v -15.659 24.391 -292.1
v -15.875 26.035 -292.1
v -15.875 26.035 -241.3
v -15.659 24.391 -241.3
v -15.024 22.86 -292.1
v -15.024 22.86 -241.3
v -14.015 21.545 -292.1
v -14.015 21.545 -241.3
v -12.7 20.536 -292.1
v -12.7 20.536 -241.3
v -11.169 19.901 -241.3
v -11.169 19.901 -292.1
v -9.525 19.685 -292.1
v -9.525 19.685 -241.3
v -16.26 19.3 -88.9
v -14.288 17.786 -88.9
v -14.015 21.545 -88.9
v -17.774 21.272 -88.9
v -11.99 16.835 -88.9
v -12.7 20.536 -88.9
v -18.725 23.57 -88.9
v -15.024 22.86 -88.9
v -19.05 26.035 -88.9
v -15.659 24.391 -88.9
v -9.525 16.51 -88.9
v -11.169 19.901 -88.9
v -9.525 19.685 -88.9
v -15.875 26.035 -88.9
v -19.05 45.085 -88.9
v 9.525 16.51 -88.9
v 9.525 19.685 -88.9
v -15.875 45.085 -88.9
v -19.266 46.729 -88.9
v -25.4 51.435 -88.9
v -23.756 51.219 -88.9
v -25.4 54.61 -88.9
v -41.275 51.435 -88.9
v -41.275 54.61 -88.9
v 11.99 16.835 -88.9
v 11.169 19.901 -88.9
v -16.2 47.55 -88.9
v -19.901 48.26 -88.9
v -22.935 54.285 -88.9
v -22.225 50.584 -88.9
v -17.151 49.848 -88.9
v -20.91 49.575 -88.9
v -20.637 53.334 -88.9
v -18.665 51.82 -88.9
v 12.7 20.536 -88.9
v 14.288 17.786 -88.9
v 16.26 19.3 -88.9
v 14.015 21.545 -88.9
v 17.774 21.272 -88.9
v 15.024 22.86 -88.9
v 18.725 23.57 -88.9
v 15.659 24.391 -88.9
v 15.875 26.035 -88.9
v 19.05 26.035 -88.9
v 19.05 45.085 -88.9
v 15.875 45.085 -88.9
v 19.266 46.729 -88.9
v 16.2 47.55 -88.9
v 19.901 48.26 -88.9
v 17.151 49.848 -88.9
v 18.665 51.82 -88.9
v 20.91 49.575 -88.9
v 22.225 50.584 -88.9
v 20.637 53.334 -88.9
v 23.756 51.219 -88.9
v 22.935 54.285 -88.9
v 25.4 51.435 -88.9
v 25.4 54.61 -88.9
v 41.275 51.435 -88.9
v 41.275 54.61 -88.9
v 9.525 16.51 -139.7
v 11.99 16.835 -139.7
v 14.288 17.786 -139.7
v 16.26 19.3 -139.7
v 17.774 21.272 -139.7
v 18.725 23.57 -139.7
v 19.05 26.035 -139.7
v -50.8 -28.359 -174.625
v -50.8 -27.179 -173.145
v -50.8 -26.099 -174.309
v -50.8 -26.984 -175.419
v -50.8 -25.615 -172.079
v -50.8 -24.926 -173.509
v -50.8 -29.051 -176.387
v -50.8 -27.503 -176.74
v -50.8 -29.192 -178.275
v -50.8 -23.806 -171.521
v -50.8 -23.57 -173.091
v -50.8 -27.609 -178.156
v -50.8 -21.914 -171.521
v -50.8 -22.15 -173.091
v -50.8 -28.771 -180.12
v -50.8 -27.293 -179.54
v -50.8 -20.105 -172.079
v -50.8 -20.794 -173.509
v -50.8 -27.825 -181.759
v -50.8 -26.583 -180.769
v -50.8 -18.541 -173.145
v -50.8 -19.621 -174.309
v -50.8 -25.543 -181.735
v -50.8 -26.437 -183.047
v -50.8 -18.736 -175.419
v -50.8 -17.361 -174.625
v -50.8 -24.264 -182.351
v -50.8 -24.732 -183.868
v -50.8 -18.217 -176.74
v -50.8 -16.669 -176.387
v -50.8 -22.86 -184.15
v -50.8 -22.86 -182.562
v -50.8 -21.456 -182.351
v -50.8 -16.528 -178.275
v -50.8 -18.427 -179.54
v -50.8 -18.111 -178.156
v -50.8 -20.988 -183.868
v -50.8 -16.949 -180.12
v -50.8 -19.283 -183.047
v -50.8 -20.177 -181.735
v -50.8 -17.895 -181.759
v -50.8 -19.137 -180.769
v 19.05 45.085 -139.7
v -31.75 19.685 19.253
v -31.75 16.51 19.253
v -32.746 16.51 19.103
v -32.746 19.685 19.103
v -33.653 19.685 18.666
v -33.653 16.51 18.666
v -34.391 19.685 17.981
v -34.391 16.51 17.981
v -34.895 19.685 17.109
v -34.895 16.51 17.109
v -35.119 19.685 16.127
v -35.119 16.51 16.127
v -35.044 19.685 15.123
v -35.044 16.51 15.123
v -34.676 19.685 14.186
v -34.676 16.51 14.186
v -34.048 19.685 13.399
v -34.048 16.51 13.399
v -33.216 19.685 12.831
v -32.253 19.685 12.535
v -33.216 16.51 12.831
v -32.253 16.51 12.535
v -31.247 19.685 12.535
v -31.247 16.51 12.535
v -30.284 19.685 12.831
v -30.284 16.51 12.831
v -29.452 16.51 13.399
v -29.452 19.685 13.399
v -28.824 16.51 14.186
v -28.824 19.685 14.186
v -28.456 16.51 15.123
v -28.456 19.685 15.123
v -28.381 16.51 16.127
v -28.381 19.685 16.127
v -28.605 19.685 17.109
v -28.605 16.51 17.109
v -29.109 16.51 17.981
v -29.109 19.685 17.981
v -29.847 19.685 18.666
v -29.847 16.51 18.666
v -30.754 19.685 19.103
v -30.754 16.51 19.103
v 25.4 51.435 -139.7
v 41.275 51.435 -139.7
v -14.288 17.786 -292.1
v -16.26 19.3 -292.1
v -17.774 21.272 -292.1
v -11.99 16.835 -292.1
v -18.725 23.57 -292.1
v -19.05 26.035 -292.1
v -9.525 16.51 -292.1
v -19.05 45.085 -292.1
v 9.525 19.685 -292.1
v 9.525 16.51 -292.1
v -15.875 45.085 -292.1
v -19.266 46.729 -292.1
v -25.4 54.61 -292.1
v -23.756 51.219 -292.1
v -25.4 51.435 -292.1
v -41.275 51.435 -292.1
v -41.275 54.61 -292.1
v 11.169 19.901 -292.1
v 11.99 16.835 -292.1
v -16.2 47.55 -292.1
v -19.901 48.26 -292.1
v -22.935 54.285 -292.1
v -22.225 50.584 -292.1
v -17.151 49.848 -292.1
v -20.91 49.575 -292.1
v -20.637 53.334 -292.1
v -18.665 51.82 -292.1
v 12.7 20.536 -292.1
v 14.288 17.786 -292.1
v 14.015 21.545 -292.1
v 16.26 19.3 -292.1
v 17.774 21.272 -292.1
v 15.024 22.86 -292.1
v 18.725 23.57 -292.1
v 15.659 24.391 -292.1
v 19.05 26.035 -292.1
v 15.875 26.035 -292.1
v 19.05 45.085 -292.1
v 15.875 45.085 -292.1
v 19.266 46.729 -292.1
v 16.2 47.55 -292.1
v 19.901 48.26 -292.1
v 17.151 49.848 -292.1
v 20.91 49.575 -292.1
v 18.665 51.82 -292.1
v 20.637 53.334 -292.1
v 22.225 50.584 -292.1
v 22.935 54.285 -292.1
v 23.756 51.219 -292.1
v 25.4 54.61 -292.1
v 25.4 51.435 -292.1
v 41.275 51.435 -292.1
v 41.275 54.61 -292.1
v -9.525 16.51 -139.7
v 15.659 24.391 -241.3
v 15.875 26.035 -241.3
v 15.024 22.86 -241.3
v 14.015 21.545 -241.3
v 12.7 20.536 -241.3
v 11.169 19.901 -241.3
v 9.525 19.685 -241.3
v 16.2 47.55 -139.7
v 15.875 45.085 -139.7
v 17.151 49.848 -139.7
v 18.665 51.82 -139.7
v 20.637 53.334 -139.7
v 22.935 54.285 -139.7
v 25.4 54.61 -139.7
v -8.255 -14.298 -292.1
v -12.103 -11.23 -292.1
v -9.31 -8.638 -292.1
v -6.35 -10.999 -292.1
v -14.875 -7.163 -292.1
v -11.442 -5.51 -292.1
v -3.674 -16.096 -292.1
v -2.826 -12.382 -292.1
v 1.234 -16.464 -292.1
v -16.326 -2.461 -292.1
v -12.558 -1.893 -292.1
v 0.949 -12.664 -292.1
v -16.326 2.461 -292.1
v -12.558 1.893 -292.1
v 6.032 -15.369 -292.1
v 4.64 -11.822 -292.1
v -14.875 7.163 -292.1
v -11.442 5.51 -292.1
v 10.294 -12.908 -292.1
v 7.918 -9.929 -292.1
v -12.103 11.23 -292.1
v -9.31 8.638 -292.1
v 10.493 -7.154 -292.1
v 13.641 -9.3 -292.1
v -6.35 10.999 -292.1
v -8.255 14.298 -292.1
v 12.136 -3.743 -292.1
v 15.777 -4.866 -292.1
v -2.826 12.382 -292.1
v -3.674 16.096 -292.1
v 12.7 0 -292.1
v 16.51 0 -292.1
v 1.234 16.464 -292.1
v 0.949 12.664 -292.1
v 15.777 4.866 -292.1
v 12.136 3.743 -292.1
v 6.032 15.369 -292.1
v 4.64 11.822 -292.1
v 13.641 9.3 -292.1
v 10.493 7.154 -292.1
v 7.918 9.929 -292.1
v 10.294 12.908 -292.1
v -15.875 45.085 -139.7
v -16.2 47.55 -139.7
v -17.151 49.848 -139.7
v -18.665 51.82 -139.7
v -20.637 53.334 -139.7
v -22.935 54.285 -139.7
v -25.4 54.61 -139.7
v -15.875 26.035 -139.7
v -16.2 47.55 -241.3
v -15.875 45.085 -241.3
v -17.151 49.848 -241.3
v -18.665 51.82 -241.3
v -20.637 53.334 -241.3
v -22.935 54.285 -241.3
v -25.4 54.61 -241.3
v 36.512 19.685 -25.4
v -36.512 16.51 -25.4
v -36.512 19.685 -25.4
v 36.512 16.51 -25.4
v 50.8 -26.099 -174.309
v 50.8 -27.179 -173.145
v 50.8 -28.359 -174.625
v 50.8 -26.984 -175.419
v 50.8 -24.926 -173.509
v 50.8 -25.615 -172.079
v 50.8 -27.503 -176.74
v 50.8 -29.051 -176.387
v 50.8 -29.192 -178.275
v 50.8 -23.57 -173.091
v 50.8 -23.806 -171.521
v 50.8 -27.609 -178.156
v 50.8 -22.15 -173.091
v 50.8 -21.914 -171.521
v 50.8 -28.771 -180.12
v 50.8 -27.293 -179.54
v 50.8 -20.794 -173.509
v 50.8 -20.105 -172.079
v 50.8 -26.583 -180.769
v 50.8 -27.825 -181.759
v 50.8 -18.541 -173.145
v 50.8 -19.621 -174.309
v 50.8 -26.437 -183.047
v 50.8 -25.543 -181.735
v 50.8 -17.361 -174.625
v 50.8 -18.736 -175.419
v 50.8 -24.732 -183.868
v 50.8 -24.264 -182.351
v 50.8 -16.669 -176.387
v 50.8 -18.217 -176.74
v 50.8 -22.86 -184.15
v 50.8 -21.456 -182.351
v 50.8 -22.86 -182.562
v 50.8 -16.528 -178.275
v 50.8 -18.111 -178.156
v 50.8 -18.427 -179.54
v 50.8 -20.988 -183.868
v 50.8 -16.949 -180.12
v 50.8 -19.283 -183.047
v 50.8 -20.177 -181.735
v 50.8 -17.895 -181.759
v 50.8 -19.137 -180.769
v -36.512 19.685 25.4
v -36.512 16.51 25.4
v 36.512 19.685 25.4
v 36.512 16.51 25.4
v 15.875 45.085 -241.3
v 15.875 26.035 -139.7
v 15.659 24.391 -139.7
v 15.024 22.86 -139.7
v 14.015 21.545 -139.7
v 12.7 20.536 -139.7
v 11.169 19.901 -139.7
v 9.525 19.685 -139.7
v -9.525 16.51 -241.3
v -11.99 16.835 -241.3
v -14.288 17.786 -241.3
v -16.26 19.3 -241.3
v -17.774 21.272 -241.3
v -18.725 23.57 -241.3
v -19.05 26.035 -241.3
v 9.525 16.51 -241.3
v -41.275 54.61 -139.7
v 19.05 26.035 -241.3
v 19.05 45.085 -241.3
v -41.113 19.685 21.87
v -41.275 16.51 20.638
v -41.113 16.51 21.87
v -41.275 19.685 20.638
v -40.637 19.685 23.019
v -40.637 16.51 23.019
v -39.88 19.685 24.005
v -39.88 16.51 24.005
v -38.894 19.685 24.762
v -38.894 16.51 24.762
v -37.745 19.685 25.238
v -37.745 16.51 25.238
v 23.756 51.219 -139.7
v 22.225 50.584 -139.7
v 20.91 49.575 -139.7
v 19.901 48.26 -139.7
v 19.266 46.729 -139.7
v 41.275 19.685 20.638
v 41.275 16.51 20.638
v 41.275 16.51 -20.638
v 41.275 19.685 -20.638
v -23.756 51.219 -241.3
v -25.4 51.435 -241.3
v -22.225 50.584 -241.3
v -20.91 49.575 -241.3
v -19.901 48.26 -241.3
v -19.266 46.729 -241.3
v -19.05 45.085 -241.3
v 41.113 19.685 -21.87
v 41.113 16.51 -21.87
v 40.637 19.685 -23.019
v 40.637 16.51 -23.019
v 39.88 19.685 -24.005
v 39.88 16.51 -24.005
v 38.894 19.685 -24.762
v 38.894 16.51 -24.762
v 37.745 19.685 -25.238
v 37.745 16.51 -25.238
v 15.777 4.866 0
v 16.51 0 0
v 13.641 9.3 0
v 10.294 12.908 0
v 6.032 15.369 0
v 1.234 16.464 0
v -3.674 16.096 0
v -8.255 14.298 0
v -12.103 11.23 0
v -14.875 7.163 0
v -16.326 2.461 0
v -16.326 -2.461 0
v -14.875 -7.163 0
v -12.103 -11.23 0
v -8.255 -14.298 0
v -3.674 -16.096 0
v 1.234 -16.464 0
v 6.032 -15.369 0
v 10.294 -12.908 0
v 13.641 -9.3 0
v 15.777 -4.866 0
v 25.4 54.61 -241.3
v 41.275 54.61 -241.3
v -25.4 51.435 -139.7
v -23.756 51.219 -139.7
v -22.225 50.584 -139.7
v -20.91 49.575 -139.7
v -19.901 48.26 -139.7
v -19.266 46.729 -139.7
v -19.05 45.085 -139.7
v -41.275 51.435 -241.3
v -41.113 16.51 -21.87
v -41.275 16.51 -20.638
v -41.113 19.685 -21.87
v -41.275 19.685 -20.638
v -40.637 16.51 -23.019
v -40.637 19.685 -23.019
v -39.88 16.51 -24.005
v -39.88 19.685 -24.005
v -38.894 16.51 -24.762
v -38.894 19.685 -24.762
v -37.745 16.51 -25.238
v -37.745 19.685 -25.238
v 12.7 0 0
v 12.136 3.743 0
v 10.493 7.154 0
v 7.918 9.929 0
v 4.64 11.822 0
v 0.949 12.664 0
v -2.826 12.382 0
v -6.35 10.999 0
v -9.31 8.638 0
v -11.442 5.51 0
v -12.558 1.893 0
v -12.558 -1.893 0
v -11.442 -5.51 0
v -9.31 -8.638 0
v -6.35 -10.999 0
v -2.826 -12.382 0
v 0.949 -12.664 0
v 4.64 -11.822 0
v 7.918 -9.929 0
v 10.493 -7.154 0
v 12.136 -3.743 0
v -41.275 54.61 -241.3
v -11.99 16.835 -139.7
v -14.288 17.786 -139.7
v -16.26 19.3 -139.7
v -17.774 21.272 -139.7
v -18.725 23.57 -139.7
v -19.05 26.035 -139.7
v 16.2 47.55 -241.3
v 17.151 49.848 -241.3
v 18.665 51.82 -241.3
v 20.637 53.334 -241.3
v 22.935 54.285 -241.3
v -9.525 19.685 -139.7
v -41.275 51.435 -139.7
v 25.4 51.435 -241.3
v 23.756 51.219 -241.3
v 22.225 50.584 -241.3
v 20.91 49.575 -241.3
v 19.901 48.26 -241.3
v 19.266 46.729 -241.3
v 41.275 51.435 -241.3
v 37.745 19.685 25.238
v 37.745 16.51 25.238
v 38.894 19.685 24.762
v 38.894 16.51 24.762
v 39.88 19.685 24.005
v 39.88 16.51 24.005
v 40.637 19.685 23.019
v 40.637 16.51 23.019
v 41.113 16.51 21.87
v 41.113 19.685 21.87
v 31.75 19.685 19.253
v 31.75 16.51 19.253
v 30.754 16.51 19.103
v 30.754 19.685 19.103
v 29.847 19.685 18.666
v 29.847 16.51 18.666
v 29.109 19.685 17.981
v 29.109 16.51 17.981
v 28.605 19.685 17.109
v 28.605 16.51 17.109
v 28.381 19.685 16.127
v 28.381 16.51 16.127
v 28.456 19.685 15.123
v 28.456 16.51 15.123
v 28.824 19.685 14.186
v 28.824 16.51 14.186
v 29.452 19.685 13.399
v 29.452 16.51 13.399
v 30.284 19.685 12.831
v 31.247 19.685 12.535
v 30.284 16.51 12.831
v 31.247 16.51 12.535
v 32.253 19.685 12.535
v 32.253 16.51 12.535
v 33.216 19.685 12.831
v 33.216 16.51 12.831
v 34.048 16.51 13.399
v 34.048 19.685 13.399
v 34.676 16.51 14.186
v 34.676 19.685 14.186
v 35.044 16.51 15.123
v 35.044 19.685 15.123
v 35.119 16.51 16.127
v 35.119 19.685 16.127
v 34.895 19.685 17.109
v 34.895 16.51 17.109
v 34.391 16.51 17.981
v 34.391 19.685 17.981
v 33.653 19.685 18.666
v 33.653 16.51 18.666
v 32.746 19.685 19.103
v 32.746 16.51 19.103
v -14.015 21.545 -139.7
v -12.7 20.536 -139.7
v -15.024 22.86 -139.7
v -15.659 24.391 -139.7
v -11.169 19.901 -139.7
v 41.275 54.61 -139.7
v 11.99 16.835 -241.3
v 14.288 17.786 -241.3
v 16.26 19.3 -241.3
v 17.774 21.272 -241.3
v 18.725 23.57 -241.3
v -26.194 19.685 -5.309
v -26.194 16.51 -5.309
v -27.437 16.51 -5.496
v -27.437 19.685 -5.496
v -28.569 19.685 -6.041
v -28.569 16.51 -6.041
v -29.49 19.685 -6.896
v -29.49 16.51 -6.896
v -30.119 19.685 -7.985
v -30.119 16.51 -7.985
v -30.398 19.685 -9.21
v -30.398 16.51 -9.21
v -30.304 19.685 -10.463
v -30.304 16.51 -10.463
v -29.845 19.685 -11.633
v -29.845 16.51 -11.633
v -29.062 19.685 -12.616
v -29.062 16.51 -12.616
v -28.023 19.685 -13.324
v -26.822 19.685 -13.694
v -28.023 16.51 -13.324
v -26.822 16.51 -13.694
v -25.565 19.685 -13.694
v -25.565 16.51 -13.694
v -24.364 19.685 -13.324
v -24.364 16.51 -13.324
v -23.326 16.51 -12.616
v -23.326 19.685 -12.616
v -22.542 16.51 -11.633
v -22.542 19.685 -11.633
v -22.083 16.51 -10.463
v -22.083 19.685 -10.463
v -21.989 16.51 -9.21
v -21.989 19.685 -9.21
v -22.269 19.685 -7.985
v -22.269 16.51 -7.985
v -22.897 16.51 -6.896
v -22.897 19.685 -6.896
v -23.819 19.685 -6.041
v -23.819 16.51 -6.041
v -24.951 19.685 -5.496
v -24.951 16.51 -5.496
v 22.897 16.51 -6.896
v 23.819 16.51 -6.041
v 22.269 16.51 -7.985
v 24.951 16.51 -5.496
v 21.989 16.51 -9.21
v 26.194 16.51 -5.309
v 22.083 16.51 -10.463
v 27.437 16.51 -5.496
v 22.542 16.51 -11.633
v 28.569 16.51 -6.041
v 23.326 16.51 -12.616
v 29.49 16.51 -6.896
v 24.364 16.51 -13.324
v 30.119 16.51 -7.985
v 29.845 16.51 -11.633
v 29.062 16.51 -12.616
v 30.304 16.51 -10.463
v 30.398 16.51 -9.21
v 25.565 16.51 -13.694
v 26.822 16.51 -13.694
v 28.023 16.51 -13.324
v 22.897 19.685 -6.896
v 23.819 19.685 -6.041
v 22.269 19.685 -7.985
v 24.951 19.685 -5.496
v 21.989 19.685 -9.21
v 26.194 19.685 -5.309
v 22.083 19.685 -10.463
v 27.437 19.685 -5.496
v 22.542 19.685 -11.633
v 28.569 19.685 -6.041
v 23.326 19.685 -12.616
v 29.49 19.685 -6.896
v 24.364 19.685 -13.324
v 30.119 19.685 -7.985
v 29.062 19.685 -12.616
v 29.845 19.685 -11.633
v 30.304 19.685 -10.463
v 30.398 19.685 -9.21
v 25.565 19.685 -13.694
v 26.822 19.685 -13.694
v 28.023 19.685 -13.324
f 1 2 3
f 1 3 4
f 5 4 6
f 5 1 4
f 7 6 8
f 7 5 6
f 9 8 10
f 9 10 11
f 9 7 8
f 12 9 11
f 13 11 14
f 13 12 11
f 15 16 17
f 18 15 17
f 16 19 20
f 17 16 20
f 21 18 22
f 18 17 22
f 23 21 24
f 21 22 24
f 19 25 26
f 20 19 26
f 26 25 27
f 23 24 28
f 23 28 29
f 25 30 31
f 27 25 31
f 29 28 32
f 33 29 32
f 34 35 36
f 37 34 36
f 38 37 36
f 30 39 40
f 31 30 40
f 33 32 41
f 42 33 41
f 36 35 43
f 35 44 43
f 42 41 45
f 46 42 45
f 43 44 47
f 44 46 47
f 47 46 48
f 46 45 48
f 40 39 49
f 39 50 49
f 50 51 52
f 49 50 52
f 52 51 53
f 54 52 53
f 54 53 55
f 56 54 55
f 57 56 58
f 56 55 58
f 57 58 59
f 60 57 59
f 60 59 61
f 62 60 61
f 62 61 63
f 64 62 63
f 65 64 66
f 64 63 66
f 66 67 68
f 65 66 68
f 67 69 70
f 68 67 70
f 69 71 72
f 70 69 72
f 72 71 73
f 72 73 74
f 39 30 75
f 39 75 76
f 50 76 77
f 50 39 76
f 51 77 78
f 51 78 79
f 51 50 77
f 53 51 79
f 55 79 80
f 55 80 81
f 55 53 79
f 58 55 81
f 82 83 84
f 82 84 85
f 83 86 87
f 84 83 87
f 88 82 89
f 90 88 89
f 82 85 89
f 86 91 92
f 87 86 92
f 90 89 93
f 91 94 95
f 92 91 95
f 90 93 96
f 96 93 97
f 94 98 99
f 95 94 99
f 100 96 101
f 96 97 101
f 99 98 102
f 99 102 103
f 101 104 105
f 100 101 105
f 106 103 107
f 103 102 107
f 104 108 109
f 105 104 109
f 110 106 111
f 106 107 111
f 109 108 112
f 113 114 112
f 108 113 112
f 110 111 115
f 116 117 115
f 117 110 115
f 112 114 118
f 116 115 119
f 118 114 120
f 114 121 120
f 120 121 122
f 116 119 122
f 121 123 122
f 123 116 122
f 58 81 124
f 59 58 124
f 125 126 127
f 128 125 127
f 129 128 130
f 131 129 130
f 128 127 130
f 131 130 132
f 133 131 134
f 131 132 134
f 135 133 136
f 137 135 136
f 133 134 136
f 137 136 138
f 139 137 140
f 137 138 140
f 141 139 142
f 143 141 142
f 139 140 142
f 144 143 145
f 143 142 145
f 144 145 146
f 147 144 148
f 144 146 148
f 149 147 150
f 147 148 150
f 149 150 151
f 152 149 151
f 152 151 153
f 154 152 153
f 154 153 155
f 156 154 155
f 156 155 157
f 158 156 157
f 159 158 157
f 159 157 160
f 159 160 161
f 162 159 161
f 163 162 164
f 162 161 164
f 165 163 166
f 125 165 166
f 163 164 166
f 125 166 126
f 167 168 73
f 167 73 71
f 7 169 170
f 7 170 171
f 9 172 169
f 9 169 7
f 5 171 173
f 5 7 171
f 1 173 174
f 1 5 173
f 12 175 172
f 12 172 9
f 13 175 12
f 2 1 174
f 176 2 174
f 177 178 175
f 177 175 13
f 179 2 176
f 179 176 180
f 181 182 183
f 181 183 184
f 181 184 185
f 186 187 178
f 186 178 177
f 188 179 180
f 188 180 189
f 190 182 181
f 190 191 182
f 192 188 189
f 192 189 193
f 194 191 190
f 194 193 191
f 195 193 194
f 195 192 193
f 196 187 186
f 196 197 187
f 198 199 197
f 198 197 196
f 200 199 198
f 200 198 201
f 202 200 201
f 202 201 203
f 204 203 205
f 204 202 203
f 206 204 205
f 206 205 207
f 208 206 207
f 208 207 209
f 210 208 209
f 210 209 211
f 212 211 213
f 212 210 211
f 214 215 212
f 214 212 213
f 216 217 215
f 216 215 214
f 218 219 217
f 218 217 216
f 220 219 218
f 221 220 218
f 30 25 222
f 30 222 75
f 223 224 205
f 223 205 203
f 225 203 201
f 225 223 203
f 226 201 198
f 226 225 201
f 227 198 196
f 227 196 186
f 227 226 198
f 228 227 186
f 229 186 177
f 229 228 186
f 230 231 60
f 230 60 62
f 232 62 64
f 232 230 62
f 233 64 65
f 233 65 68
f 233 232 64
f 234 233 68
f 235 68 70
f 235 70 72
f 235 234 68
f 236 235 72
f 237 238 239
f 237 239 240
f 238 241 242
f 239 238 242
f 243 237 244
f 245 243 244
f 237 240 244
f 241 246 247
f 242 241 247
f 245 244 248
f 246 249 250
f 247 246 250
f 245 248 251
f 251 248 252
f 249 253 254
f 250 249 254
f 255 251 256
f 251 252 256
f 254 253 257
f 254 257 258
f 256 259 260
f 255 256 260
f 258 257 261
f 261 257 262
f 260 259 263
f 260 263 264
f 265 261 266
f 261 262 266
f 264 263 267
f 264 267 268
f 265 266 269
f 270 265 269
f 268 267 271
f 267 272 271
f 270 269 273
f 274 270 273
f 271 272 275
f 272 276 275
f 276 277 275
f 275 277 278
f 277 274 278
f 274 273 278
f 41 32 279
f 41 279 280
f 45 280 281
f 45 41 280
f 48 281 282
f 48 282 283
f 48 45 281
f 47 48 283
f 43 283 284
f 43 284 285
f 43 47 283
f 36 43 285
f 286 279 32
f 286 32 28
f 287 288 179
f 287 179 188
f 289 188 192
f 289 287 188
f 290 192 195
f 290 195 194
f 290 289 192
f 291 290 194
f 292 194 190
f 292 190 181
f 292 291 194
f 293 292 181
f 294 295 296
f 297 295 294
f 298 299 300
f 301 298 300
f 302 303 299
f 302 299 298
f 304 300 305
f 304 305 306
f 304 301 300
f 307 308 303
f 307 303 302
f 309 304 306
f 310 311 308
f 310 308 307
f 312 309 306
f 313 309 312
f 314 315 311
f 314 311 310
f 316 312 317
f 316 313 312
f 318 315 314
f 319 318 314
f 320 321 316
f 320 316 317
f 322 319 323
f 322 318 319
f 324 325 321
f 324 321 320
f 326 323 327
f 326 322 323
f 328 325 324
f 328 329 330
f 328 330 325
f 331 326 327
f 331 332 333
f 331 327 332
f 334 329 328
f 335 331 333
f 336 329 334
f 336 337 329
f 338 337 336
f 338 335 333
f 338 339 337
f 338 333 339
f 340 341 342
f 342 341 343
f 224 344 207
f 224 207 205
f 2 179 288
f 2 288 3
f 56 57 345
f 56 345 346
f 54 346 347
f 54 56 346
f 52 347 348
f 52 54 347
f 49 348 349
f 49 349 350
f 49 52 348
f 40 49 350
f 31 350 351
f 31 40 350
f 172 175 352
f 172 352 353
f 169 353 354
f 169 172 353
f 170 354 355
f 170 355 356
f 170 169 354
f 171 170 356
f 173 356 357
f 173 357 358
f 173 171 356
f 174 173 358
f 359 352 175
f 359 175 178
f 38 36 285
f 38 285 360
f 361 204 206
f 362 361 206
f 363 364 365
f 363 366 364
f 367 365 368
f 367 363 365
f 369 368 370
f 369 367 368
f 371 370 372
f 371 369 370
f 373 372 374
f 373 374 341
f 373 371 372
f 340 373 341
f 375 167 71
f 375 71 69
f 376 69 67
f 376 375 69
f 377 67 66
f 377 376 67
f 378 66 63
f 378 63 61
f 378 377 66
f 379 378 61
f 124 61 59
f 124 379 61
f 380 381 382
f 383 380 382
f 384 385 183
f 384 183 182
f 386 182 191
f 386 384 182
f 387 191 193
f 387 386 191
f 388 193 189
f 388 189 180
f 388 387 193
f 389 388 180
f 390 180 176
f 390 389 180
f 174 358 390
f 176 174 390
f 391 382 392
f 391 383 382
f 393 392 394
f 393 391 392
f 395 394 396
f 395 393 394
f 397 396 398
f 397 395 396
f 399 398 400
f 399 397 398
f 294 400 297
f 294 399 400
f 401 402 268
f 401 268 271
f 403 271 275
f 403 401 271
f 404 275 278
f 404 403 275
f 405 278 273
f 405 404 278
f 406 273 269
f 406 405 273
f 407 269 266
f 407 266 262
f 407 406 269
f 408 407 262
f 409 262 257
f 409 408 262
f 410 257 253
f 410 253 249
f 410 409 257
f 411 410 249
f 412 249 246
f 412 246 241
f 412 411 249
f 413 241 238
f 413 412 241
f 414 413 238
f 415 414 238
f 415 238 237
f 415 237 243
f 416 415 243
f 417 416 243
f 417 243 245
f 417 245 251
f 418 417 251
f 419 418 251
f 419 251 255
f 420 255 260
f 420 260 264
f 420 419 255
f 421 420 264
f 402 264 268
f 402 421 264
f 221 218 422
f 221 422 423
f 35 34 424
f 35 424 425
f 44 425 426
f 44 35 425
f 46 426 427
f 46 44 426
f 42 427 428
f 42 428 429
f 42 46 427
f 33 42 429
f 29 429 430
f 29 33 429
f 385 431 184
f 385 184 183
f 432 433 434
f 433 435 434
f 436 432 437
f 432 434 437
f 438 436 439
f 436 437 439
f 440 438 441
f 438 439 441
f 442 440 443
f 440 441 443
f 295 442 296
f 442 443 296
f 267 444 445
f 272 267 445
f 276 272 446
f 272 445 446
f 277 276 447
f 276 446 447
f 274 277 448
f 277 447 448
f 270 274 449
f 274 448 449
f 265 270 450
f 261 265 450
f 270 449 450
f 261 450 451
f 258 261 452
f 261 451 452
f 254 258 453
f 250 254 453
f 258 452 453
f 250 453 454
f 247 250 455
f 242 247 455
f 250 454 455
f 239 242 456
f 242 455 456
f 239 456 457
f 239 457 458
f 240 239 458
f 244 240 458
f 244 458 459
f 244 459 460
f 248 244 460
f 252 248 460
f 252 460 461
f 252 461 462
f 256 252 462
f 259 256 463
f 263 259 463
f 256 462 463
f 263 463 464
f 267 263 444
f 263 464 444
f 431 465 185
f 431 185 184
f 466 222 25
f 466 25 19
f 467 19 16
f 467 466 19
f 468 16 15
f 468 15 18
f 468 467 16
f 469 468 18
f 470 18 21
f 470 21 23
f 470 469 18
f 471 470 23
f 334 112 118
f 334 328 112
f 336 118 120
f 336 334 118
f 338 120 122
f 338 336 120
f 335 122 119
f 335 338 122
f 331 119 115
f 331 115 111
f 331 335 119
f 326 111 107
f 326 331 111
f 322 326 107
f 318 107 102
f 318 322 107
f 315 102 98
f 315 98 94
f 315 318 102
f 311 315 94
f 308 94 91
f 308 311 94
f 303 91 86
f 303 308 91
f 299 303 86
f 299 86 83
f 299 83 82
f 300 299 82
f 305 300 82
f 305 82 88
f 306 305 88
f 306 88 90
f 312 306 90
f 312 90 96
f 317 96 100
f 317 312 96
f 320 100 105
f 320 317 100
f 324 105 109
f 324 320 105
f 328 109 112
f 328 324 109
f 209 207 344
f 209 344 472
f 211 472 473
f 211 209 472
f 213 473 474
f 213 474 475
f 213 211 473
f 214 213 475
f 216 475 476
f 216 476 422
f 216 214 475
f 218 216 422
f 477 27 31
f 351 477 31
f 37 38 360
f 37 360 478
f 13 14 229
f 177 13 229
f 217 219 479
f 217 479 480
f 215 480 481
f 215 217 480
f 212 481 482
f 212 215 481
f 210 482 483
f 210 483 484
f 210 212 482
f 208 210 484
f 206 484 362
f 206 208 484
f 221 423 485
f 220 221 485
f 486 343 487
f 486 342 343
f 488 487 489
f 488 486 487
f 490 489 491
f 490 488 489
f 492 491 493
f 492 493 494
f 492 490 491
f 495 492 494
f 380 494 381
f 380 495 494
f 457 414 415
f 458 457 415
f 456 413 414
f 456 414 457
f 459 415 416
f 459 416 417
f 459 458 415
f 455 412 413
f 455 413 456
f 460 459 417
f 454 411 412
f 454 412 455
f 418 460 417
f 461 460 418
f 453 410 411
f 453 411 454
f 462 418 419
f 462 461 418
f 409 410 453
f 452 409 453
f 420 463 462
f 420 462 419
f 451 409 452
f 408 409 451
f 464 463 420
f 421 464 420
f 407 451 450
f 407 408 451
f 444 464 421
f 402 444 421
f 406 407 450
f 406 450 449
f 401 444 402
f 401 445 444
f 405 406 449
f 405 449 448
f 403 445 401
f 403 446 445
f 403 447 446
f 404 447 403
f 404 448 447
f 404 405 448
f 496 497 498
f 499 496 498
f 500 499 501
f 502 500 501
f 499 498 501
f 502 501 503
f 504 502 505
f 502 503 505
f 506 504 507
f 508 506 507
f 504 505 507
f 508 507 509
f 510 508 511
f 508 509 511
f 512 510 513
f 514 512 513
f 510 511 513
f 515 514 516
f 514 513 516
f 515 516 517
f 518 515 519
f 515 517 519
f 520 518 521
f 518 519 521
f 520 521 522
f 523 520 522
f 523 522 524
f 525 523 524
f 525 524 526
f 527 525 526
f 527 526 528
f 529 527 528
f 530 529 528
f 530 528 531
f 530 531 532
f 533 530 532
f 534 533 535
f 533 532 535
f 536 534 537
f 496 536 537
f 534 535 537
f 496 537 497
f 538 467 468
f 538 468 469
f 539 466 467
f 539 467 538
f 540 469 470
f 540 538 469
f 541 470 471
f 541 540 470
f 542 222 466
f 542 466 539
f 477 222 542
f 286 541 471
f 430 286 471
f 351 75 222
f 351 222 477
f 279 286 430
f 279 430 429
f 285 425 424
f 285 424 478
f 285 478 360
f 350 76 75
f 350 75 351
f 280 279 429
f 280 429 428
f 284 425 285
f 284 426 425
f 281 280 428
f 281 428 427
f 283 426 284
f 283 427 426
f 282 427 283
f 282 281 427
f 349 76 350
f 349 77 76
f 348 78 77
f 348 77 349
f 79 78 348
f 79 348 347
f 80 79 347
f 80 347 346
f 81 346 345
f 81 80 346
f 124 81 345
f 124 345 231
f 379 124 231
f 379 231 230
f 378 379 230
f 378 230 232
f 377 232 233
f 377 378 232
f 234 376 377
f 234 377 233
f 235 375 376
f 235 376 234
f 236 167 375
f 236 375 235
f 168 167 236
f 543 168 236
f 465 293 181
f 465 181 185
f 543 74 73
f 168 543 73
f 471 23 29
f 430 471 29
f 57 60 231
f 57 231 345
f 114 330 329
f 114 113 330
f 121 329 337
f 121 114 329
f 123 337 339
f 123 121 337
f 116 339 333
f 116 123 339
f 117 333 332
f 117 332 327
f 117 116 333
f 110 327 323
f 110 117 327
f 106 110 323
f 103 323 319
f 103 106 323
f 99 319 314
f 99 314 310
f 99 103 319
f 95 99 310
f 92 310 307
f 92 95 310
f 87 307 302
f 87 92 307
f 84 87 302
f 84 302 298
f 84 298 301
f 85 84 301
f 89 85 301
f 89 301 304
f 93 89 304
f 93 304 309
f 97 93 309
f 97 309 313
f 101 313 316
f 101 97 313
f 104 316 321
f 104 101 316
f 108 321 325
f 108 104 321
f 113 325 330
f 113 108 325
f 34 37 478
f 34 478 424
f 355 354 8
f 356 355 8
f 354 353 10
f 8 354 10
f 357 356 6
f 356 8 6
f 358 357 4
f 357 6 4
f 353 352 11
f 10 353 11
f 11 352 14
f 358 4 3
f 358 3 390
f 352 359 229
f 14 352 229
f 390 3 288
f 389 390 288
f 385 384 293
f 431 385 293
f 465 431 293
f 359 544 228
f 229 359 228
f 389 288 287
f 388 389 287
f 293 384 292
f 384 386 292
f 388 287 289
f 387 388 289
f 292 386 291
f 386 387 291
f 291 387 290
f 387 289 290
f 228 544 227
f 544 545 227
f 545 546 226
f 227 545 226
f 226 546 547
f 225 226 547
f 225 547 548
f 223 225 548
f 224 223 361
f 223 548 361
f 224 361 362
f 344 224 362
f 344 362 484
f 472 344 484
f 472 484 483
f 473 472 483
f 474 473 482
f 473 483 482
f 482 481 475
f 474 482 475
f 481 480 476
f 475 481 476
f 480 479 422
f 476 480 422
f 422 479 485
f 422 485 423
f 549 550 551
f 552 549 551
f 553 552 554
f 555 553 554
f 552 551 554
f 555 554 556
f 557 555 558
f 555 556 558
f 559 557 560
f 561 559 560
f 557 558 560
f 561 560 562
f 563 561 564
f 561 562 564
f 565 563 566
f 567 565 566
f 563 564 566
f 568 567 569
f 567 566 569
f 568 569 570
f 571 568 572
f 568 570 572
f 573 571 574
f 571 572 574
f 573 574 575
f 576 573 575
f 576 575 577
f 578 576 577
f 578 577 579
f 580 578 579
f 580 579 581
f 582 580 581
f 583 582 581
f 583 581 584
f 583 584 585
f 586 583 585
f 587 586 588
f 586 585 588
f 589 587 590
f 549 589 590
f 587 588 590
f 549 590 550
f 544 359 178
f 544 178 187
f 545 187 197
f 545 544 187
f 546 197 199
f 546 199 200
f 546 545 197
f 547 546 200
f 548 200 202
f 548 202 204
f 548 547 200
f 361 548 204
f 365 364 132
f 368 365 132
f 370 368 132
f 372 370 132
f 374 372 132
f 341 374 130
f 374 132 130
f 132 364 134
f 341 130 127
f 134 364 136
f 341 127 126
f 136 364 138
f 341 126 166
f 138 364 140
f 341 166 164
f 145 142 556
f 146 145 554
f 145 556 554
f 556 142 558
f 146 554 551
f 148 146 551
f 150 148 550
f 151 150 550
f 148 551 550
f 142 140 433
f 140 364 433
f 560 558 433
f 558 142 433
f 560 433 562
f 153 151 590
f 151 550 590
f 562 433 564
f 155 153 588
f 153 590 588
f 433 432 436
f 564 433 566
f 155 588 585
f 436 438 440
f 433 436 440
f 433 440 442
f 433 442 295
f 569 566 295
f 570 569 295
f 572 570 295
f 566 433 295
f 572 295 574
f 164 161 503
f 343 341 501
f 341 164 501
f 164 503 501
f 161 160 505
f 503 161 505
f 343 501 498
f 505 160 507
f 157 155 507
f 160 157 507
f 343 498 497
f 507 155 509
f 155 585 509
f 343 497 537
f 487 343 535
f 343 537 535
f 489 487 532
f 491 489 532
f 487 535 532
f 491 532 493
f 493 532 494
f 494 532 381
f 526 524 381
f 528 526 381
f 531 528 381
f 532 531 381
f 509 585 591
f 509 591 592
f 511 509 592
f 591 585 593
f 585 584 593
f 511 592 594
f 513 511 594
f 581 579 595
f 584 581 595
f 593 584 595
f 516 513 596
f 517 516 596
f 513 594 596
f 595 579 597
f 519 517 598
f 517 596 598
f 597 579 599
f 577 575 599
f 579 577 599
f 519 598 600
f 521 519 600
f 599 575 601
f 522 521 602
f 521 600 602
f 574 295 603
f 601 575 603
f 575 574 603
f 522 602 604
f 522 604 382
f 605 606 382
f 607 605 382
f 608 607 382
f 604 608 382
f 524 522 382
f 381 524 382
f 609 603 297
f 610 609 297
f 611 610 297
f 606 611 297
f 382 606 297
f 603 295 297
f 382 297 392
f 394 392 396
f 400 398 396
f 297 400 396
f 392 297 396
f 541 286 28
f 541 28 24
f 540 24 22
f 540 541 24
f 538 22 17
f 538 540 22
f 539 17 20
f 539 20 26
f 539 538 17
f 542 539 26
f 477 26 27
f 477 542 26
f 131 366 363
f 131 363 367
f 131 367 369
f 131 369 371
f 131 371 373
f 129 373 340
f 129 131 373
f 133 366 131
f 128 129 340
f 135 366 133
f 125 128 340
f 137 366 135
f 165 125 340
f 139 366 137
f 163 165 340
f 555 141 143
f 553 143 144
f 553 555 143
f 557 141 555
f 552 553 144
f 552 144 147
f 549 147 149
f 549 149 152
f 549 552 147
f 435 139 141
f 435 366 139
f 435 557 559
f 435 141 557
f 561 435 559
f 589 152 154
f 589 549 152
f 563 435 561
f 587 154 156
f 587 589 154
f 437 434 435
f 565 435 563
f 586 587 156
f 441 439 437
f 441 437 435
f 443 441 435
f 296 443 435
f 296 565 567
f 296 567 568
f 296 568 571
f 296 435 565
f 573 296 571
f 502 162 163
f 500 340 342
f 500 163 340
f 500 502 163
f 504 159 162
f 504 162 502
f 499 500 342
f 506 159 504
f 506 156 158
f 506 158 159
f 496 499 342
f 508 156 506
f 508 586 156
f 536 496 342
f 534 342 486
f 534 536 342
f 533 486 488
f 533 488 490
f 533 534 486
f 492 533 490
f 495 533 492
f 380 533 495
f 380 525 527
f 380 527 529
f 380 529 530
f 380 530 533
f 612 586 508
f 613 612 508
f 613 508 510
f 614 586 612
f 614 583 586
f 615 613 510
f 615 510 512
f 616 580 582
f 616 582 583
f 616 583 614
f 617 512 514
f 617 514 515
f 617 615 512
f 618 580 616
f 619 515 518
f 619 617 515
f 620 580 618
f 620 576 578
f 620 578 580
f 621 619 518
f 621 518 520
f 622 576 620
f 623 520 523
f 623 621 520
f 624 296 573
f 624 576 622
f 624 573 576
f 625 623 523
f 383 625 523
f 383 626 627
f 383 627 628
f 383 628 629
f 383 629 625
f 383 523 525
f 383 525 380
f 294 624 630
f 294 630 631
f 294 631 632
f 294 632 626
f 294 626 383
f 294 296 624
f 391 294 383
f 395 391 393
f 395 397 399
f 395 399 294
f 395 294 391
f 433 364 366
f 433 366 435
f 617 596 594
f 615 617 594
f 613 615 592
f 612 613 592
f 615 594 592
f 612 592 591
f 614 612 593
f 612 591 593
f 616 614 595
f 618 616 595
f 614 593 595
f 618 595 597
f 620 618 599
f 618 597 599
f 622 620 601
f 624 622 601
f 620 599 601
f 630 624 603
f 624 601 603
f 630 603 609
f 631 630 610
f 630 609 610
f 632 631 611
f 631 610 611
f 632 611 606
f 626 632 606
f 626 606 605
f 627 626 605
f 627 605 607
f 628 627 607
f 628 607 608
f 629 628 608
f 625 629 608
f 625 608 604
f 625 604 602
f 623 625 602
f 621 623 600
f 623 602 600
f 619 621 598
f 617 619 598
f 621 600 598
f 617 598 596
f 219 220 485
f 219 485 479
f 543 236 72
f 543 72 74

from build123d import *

# Parameters (mm, degrees)
SKETCH1_R                         = 16.51
SKETCH1_R_2                       = 12.7
BOSS_EXTRUDE1_DEPTH               = 292.1
BOSS_EXTRUDE2_START               = 16.51
SKETCH2_W                         = 82.55
SKETCH2_H                         = 50.8
BOSS_EXTRUDE2_DEPTH               = 3.175
SKETCH2_W_2                       = 38.1
BOSS_EXTRUDE2_2_DEPTH             = 3.175
FILLET1_R                         = 4.7625
SKETCH4_W                         = 3.3782
SKETCH4_H                         = 36.195
F_1_4_CLEARANCE_HOLE1_AT_2_COUNT  = 2
F_1_4_CLEARANCE_HOLE1_AT_2_PITCH  = 63.5
SKETCH18_W                        = 4.2164
SKETCH18_H                        = 36.195
F_5_16_CLEARANCE_HOLE1_AT_2_COUNT = 2
F_5_16_CLEARANCE_HOLE1_AT_2_PITCH = 52.3875
SKETCH16_R                        = 6.35
SKETCH16_R_2                      = 4.7625
BOSS_EXTRUDE3_DEPTH               = 50.8
EDGE_FLANGE1_STRIP_W              = 25.4
EDGE_FLANGE1_STRIP_H              = 3.175
EDGE_FLANGE1_STRIP_CUT_DEPTH      = 50.8
EDGE_FLANGE1_STRIP_2_W            = 25.4
EDGE_FLANGE1_STRIP_2_H            = 3.175
EDGE_FLANGE1_STRIP_CUT_2_DEPTH    = 50.8
EDGE_FLANGE1_DEPTH                = 50.8
EDGE_FLANGE1_BEND_DEPTH           = 50.8
EDGE_FLANGE3_STRIP_W              = 25.4
EDGE_FLANGE3_STRIP_H              = 3.175
EDGE_FLANGE3_STRIP_CUT_DEPTH      = 50.8
EDGE_FLANGE3_STRIP_2_W            = 25.4
EDGE_FLANGE3_STRIP_2_H            = 3.175
EDGE_FLANGE3_STRIP_CUT_2_DEPTH    = 50.8
EDGE_FLANGE3_DEPTH                = 50.8
EDGE_FLANGE3_BEND_DEPTH           = 50.8
LPATTERN1_COUNT                   = 2
LPATTERN1_PITCH                   = 152.4


# Sheet-metal steps are written as plain solids
with BuildPart() as part:
    # Sketch1 → Boss-Extrude1 (new body)
    with BuildSketch(Plane.XY):
        Circle(SKETCH1_R)
        Circle(SKETCH1_R_2, mode=Mode.SUBTRACT)
    extrude(amount=-BOSS_EXTRUDE1_DEPTH)


with BuildPart() as body_2:
    # Sketch2 → Boss-Extrude2 (new body)
    with BuildSketch(Plane(origin=(0, 0, 0), x_dir=(1, 0, 0), z_dir=(0, 1, 0)).offset(BOSS_EXTRUDE2_START)):
        Rectangle(SKETCH2_W, SKETCH2_H)
    extrude(amount=BOSS_EXTRUDE2_DEPTH)

    # Fillet1
    fillet1_edges = [body_2.edges().sort_by_distance(p)[0] for p in [
        (-41.275, 18.0975, -25.4),
        (41.275, 18.0975, -25.4),
        (41.275, 18.0975, 25.4),
        (-41.275, 18.0975, 25.4),
    ]]
    fillet(fillet1_edges, radius=FILLET1_R)

    # Sketch4 → 1/4 Clearance Hole1 (revolve, cut)
    with BuildSketch(Plane(origin=(-31.75, 19.685, 15.875), x_dir=(0, 0, 1), z_dir=(1, 0, 0))):
        with Locations((1.6891, 18.0975)):
            Rectangle(SKETCH4_W, SKETCH4_H)
    f_1_4_clearance_hole1 = revolve(axis=Axis((-31.75, 26.035, 15.875), (0, -1, 0)), mode=Mode.SUBTRACT)

    # 1/4 Clearance Hole1 at 2: 1/4 Clearance Hole1 ×2
    with Locations(*[(i * F_1_4_CLEARANCE_HOLE1_AT_2_PITCH, 0, 0) for i in range(1, F_1_4_CLEARANCE_HOLE1_AT_2_COUNT)]):
        add(f_1_4_clearance_hole1, mode=Mode.SUBTRACT)

    # Sketch18 → 5/16 Clearance Hole1 (revolve, cut)
    with BuildSketch(Plane(origin=(-26.19375, 19.685, -9.525), x_dir=(0, 0, 1), z_dir=(1, 0, 0))):
        with Locations((2.1082, 18.0975)):
            Rectangle(SKETCH18_W, SKETCH18_H)
    f_5_16_clearance_hole1 = revolve(axis=Axis((-26.19375, 26.035, -9.525), (0, -1, 0)), mode=Mode.SUBTRACT)

    # 5/16 Clearance Hole1 at 2: 5/16 Clearance Hole1 ×2
    with Locations(*[(i * F_5_16_CLEARANCE_HOLE1_AT_2_PITCH, 0, 0) for i in range(1, F_5_16_CLEARANCE_HOLE1_AT_2_COUNT)]):
        add(f_5_16_clearance_hole1, mode=Mode.SUBTRACT)


with BuildPart() as body_3:
    # Sketch2 → Boss-Extrude2 2 (new body)
    with BuildSketch(Plane(origin=(0, 0, 0), x_dir=(1, 0, 0), z_dir=(0, 1, 0)).offset(BOSS_EXTRUDE2_START)):
        with Locations((0, 114.3)):
            Rectangle(SKETCH2_W_2, SKETCH2_H)
    extrude(amount=BOSS_EXTRUDE2_2_DEPTH)

    # Edge-Flange1 strip (across the edge) → Edge-Flange1 strip cut (cut)
    with BuildSketch(Plane(origin=(19.05, 19.685, -88.9), x_dir=(-1, 0, 0), z_dir=(0, 0, -1))):
        with Locations((-3.175, -1.5875)):
            Rectangle(EDGE_FLANGE1_STRIP_W, EDGE_FLANGE1_STRIP_H)
    extrude(amount=EDGE_FLANGE1_STRIP_CUT_DEPTH, mode=Mode.SUBTRACT)

    # Edge-Flange1 strip 2 (across the edge) → Edge-Flange1 strip cut 2 (cut)
    with BuildSketch(Plane(origin=(-19.05, 19.685, -139.7), x_dir=(1, 0, 0), z_dir=(0, 0, 1))):
        with Locations((-3.175, -1.5875)):
            Rectangle(EDGE_FLANGE1_STRIP_2_W, EDGE_FLANGE1_STRIP_2_H)
    extrude(amount=EDGE_FLANGE1_STRIP_CUT_2_DEPTH, mode=Mode.SUBTRACT)

    # Edge-Flange1 section (across the edge) → Edge-Flange1 (add)
    with BuildSketch(Plane(origin=(19.05, 19.685, -88.9), x_dir=(-1, 0, 0), z_dir=(0, 0, -1))):
        with BuildLine():
            Line((0, 6.35), (0, 34.925))
            Line((0, 34.925), (3.175, 34.925))
            Line((3.175, 34.925), (3.175, 6.35))
            ThreePointArc((3.175, 6.35), (5.034871939, 1.859871939), (9.525, 0))
            Line((9.525, 0), (9.525, -3.175))
            ThreePointArc((9.525, -3.175), (2.789807909, -0.385192091), (0, 6.35))
        make_face()
    extrude(amount=EDGE_FLANGE1_DEPTH)

    # Edge-Flange1 section 2 (across the edge) → Edge-Flange1 bend (add)
    with BuildSketch(Plane(origin=(-19.05, 19.685, -139.7), x_dir=(1, 0, 0), z_dir=(0, 0, 1))):
        with BuildLine():
            Line((0, 6.35), (0, 34.925))
            Line((0, 34.925), (3.175, 34.925))
            Line((3.175, 34.925), (3.175, 6.35))
            ThreePointArc((3.175, 6.35), (5.034871939, 1.859871939), (9.525, 0))
            Line((9.525, 0), (9.525, -3.175))
            ThreePointArc((9.525, -3.175), (2.789807909, -0.385192091), (0, 6.35))
        make_face()
    extrude(amount=EDGE_FLANGE1_BEND_DEPTH)

    # Edge-Flange3 strip (across the edge) → Edge-Flange3 strip cut (cut)
    with BuildSketch(Plane(origin=(-19.05, 54.61, -88.9), x_dir=(0, -1, 0), z_dir=(0, 0, -1))):
        with Locations((-3.175, -1.5875)):
            Rectangle(EDGE_FLANGE3_STRIP_W, EDGE_FLANGE3_STRIP_H)
    extrude(amount=EDGE_FLANGE3_STRIP_CUT_DEPTH, mode=Mode.SUBTRACT)

    # Edge-Flange3 strip 2 (across the edge) → Edge-Flange3 strip cut 2 (cut)
    with BuildSketch(Plane(origin=(19.05, 54.61, -139.7), x_dir=(0, -1, 0), z_dir=(0, 0, 1))):
        with Locations((-3.175, -1.5875)):
            Rectangle(EDGE_FLANGE3_STRIP_2_W, EDGE_FLANGE3_STRIP_2_H)
    extrude(amount=EDGE_FLANGE3_STRIP_CUT_2_DEPTH, mode=Mode.SUBTRACT)

    # Edge-Flange3 section (across the edge) → Edge-Flange3 (add)
    with BuildSketch(Plane(origin=(-19.05, 54.61, -88.9), x_dir=(0, -1, 0), z_dir=(0, 0, -1))):
        with BuildLine():
            Line((0, 6.35), (0, 22.225))
            Line((0, 22.225), (3.175, 22.225))
            Line((3.175, 22.225), (3.175, 6.35))
            ThreePointArc((3.175, 6.35), (5.034871939, 1.859871939), (9.525, 0))
            Line((9.525, 0), (9.525, -3.175))
            ThreePointArc((9.525, -3.175), (2.789807909, -0.385192091), (0, 6.35))
        make_face()
    extrude(amount=EDGE_FLANGE3_DEPTH)

    # Edge-Flange3 section 2 (across the edge) → Edge-Flange3 bend (add)
    with BuildSketch(Plane(origin=(19.05, 54.61, -139.7), x_dir=(0, -1, 0), z_dir=(0, 0, 1))):
        with BuildLine():
            Line((0, 6.35), (0, 22.225))
            Line((0, 22.225), (3.175, 22.225))
            Line((3.175, 22.225), (3.175, 6.35))
            ThreePointArc((3.175, 6.35), (5.034871939, 1.859871939), (9.525, 0))
            Line((9.525, 0), (9.525, -3.175))
            ThreePointArc((9.525, -3.175), (2.789807909, -0.385192091), (0, 6.35))
        make_face()
    extrude(amount=EDGE_FLANGE3_BEND_DEPTH)


with BuildPart() as body_4:
    # Sketch16 → Boss-Extrude3 (new, symmetric)
    with BuildSketch(Plane(origin=(0, 0, 0), x_dir=(0, 0, -1), z_dir=(1, 0, 0))):
        with Locations((177.8, -22.86)):
            Circle(SKETCH16_R)
        with Locations((177.8, -22.86)):
            Circle(SKETCH16_R_2, mode=Mode.SUBTRACT)
    extrude(amount=BOSS_EXTRUDE3_DEPTH, both=True)


with BuildPart() as lpattern1_1:
    # LPattern1: pattern copy
    add(body_3.part.moved(Location(Vector(0, 0, -1) * (1 * LPATTERN1_PITCH))))


solid = Compound([part.part, body_2.part, body_3.part, body_4.part, lpattern1_1.part])
